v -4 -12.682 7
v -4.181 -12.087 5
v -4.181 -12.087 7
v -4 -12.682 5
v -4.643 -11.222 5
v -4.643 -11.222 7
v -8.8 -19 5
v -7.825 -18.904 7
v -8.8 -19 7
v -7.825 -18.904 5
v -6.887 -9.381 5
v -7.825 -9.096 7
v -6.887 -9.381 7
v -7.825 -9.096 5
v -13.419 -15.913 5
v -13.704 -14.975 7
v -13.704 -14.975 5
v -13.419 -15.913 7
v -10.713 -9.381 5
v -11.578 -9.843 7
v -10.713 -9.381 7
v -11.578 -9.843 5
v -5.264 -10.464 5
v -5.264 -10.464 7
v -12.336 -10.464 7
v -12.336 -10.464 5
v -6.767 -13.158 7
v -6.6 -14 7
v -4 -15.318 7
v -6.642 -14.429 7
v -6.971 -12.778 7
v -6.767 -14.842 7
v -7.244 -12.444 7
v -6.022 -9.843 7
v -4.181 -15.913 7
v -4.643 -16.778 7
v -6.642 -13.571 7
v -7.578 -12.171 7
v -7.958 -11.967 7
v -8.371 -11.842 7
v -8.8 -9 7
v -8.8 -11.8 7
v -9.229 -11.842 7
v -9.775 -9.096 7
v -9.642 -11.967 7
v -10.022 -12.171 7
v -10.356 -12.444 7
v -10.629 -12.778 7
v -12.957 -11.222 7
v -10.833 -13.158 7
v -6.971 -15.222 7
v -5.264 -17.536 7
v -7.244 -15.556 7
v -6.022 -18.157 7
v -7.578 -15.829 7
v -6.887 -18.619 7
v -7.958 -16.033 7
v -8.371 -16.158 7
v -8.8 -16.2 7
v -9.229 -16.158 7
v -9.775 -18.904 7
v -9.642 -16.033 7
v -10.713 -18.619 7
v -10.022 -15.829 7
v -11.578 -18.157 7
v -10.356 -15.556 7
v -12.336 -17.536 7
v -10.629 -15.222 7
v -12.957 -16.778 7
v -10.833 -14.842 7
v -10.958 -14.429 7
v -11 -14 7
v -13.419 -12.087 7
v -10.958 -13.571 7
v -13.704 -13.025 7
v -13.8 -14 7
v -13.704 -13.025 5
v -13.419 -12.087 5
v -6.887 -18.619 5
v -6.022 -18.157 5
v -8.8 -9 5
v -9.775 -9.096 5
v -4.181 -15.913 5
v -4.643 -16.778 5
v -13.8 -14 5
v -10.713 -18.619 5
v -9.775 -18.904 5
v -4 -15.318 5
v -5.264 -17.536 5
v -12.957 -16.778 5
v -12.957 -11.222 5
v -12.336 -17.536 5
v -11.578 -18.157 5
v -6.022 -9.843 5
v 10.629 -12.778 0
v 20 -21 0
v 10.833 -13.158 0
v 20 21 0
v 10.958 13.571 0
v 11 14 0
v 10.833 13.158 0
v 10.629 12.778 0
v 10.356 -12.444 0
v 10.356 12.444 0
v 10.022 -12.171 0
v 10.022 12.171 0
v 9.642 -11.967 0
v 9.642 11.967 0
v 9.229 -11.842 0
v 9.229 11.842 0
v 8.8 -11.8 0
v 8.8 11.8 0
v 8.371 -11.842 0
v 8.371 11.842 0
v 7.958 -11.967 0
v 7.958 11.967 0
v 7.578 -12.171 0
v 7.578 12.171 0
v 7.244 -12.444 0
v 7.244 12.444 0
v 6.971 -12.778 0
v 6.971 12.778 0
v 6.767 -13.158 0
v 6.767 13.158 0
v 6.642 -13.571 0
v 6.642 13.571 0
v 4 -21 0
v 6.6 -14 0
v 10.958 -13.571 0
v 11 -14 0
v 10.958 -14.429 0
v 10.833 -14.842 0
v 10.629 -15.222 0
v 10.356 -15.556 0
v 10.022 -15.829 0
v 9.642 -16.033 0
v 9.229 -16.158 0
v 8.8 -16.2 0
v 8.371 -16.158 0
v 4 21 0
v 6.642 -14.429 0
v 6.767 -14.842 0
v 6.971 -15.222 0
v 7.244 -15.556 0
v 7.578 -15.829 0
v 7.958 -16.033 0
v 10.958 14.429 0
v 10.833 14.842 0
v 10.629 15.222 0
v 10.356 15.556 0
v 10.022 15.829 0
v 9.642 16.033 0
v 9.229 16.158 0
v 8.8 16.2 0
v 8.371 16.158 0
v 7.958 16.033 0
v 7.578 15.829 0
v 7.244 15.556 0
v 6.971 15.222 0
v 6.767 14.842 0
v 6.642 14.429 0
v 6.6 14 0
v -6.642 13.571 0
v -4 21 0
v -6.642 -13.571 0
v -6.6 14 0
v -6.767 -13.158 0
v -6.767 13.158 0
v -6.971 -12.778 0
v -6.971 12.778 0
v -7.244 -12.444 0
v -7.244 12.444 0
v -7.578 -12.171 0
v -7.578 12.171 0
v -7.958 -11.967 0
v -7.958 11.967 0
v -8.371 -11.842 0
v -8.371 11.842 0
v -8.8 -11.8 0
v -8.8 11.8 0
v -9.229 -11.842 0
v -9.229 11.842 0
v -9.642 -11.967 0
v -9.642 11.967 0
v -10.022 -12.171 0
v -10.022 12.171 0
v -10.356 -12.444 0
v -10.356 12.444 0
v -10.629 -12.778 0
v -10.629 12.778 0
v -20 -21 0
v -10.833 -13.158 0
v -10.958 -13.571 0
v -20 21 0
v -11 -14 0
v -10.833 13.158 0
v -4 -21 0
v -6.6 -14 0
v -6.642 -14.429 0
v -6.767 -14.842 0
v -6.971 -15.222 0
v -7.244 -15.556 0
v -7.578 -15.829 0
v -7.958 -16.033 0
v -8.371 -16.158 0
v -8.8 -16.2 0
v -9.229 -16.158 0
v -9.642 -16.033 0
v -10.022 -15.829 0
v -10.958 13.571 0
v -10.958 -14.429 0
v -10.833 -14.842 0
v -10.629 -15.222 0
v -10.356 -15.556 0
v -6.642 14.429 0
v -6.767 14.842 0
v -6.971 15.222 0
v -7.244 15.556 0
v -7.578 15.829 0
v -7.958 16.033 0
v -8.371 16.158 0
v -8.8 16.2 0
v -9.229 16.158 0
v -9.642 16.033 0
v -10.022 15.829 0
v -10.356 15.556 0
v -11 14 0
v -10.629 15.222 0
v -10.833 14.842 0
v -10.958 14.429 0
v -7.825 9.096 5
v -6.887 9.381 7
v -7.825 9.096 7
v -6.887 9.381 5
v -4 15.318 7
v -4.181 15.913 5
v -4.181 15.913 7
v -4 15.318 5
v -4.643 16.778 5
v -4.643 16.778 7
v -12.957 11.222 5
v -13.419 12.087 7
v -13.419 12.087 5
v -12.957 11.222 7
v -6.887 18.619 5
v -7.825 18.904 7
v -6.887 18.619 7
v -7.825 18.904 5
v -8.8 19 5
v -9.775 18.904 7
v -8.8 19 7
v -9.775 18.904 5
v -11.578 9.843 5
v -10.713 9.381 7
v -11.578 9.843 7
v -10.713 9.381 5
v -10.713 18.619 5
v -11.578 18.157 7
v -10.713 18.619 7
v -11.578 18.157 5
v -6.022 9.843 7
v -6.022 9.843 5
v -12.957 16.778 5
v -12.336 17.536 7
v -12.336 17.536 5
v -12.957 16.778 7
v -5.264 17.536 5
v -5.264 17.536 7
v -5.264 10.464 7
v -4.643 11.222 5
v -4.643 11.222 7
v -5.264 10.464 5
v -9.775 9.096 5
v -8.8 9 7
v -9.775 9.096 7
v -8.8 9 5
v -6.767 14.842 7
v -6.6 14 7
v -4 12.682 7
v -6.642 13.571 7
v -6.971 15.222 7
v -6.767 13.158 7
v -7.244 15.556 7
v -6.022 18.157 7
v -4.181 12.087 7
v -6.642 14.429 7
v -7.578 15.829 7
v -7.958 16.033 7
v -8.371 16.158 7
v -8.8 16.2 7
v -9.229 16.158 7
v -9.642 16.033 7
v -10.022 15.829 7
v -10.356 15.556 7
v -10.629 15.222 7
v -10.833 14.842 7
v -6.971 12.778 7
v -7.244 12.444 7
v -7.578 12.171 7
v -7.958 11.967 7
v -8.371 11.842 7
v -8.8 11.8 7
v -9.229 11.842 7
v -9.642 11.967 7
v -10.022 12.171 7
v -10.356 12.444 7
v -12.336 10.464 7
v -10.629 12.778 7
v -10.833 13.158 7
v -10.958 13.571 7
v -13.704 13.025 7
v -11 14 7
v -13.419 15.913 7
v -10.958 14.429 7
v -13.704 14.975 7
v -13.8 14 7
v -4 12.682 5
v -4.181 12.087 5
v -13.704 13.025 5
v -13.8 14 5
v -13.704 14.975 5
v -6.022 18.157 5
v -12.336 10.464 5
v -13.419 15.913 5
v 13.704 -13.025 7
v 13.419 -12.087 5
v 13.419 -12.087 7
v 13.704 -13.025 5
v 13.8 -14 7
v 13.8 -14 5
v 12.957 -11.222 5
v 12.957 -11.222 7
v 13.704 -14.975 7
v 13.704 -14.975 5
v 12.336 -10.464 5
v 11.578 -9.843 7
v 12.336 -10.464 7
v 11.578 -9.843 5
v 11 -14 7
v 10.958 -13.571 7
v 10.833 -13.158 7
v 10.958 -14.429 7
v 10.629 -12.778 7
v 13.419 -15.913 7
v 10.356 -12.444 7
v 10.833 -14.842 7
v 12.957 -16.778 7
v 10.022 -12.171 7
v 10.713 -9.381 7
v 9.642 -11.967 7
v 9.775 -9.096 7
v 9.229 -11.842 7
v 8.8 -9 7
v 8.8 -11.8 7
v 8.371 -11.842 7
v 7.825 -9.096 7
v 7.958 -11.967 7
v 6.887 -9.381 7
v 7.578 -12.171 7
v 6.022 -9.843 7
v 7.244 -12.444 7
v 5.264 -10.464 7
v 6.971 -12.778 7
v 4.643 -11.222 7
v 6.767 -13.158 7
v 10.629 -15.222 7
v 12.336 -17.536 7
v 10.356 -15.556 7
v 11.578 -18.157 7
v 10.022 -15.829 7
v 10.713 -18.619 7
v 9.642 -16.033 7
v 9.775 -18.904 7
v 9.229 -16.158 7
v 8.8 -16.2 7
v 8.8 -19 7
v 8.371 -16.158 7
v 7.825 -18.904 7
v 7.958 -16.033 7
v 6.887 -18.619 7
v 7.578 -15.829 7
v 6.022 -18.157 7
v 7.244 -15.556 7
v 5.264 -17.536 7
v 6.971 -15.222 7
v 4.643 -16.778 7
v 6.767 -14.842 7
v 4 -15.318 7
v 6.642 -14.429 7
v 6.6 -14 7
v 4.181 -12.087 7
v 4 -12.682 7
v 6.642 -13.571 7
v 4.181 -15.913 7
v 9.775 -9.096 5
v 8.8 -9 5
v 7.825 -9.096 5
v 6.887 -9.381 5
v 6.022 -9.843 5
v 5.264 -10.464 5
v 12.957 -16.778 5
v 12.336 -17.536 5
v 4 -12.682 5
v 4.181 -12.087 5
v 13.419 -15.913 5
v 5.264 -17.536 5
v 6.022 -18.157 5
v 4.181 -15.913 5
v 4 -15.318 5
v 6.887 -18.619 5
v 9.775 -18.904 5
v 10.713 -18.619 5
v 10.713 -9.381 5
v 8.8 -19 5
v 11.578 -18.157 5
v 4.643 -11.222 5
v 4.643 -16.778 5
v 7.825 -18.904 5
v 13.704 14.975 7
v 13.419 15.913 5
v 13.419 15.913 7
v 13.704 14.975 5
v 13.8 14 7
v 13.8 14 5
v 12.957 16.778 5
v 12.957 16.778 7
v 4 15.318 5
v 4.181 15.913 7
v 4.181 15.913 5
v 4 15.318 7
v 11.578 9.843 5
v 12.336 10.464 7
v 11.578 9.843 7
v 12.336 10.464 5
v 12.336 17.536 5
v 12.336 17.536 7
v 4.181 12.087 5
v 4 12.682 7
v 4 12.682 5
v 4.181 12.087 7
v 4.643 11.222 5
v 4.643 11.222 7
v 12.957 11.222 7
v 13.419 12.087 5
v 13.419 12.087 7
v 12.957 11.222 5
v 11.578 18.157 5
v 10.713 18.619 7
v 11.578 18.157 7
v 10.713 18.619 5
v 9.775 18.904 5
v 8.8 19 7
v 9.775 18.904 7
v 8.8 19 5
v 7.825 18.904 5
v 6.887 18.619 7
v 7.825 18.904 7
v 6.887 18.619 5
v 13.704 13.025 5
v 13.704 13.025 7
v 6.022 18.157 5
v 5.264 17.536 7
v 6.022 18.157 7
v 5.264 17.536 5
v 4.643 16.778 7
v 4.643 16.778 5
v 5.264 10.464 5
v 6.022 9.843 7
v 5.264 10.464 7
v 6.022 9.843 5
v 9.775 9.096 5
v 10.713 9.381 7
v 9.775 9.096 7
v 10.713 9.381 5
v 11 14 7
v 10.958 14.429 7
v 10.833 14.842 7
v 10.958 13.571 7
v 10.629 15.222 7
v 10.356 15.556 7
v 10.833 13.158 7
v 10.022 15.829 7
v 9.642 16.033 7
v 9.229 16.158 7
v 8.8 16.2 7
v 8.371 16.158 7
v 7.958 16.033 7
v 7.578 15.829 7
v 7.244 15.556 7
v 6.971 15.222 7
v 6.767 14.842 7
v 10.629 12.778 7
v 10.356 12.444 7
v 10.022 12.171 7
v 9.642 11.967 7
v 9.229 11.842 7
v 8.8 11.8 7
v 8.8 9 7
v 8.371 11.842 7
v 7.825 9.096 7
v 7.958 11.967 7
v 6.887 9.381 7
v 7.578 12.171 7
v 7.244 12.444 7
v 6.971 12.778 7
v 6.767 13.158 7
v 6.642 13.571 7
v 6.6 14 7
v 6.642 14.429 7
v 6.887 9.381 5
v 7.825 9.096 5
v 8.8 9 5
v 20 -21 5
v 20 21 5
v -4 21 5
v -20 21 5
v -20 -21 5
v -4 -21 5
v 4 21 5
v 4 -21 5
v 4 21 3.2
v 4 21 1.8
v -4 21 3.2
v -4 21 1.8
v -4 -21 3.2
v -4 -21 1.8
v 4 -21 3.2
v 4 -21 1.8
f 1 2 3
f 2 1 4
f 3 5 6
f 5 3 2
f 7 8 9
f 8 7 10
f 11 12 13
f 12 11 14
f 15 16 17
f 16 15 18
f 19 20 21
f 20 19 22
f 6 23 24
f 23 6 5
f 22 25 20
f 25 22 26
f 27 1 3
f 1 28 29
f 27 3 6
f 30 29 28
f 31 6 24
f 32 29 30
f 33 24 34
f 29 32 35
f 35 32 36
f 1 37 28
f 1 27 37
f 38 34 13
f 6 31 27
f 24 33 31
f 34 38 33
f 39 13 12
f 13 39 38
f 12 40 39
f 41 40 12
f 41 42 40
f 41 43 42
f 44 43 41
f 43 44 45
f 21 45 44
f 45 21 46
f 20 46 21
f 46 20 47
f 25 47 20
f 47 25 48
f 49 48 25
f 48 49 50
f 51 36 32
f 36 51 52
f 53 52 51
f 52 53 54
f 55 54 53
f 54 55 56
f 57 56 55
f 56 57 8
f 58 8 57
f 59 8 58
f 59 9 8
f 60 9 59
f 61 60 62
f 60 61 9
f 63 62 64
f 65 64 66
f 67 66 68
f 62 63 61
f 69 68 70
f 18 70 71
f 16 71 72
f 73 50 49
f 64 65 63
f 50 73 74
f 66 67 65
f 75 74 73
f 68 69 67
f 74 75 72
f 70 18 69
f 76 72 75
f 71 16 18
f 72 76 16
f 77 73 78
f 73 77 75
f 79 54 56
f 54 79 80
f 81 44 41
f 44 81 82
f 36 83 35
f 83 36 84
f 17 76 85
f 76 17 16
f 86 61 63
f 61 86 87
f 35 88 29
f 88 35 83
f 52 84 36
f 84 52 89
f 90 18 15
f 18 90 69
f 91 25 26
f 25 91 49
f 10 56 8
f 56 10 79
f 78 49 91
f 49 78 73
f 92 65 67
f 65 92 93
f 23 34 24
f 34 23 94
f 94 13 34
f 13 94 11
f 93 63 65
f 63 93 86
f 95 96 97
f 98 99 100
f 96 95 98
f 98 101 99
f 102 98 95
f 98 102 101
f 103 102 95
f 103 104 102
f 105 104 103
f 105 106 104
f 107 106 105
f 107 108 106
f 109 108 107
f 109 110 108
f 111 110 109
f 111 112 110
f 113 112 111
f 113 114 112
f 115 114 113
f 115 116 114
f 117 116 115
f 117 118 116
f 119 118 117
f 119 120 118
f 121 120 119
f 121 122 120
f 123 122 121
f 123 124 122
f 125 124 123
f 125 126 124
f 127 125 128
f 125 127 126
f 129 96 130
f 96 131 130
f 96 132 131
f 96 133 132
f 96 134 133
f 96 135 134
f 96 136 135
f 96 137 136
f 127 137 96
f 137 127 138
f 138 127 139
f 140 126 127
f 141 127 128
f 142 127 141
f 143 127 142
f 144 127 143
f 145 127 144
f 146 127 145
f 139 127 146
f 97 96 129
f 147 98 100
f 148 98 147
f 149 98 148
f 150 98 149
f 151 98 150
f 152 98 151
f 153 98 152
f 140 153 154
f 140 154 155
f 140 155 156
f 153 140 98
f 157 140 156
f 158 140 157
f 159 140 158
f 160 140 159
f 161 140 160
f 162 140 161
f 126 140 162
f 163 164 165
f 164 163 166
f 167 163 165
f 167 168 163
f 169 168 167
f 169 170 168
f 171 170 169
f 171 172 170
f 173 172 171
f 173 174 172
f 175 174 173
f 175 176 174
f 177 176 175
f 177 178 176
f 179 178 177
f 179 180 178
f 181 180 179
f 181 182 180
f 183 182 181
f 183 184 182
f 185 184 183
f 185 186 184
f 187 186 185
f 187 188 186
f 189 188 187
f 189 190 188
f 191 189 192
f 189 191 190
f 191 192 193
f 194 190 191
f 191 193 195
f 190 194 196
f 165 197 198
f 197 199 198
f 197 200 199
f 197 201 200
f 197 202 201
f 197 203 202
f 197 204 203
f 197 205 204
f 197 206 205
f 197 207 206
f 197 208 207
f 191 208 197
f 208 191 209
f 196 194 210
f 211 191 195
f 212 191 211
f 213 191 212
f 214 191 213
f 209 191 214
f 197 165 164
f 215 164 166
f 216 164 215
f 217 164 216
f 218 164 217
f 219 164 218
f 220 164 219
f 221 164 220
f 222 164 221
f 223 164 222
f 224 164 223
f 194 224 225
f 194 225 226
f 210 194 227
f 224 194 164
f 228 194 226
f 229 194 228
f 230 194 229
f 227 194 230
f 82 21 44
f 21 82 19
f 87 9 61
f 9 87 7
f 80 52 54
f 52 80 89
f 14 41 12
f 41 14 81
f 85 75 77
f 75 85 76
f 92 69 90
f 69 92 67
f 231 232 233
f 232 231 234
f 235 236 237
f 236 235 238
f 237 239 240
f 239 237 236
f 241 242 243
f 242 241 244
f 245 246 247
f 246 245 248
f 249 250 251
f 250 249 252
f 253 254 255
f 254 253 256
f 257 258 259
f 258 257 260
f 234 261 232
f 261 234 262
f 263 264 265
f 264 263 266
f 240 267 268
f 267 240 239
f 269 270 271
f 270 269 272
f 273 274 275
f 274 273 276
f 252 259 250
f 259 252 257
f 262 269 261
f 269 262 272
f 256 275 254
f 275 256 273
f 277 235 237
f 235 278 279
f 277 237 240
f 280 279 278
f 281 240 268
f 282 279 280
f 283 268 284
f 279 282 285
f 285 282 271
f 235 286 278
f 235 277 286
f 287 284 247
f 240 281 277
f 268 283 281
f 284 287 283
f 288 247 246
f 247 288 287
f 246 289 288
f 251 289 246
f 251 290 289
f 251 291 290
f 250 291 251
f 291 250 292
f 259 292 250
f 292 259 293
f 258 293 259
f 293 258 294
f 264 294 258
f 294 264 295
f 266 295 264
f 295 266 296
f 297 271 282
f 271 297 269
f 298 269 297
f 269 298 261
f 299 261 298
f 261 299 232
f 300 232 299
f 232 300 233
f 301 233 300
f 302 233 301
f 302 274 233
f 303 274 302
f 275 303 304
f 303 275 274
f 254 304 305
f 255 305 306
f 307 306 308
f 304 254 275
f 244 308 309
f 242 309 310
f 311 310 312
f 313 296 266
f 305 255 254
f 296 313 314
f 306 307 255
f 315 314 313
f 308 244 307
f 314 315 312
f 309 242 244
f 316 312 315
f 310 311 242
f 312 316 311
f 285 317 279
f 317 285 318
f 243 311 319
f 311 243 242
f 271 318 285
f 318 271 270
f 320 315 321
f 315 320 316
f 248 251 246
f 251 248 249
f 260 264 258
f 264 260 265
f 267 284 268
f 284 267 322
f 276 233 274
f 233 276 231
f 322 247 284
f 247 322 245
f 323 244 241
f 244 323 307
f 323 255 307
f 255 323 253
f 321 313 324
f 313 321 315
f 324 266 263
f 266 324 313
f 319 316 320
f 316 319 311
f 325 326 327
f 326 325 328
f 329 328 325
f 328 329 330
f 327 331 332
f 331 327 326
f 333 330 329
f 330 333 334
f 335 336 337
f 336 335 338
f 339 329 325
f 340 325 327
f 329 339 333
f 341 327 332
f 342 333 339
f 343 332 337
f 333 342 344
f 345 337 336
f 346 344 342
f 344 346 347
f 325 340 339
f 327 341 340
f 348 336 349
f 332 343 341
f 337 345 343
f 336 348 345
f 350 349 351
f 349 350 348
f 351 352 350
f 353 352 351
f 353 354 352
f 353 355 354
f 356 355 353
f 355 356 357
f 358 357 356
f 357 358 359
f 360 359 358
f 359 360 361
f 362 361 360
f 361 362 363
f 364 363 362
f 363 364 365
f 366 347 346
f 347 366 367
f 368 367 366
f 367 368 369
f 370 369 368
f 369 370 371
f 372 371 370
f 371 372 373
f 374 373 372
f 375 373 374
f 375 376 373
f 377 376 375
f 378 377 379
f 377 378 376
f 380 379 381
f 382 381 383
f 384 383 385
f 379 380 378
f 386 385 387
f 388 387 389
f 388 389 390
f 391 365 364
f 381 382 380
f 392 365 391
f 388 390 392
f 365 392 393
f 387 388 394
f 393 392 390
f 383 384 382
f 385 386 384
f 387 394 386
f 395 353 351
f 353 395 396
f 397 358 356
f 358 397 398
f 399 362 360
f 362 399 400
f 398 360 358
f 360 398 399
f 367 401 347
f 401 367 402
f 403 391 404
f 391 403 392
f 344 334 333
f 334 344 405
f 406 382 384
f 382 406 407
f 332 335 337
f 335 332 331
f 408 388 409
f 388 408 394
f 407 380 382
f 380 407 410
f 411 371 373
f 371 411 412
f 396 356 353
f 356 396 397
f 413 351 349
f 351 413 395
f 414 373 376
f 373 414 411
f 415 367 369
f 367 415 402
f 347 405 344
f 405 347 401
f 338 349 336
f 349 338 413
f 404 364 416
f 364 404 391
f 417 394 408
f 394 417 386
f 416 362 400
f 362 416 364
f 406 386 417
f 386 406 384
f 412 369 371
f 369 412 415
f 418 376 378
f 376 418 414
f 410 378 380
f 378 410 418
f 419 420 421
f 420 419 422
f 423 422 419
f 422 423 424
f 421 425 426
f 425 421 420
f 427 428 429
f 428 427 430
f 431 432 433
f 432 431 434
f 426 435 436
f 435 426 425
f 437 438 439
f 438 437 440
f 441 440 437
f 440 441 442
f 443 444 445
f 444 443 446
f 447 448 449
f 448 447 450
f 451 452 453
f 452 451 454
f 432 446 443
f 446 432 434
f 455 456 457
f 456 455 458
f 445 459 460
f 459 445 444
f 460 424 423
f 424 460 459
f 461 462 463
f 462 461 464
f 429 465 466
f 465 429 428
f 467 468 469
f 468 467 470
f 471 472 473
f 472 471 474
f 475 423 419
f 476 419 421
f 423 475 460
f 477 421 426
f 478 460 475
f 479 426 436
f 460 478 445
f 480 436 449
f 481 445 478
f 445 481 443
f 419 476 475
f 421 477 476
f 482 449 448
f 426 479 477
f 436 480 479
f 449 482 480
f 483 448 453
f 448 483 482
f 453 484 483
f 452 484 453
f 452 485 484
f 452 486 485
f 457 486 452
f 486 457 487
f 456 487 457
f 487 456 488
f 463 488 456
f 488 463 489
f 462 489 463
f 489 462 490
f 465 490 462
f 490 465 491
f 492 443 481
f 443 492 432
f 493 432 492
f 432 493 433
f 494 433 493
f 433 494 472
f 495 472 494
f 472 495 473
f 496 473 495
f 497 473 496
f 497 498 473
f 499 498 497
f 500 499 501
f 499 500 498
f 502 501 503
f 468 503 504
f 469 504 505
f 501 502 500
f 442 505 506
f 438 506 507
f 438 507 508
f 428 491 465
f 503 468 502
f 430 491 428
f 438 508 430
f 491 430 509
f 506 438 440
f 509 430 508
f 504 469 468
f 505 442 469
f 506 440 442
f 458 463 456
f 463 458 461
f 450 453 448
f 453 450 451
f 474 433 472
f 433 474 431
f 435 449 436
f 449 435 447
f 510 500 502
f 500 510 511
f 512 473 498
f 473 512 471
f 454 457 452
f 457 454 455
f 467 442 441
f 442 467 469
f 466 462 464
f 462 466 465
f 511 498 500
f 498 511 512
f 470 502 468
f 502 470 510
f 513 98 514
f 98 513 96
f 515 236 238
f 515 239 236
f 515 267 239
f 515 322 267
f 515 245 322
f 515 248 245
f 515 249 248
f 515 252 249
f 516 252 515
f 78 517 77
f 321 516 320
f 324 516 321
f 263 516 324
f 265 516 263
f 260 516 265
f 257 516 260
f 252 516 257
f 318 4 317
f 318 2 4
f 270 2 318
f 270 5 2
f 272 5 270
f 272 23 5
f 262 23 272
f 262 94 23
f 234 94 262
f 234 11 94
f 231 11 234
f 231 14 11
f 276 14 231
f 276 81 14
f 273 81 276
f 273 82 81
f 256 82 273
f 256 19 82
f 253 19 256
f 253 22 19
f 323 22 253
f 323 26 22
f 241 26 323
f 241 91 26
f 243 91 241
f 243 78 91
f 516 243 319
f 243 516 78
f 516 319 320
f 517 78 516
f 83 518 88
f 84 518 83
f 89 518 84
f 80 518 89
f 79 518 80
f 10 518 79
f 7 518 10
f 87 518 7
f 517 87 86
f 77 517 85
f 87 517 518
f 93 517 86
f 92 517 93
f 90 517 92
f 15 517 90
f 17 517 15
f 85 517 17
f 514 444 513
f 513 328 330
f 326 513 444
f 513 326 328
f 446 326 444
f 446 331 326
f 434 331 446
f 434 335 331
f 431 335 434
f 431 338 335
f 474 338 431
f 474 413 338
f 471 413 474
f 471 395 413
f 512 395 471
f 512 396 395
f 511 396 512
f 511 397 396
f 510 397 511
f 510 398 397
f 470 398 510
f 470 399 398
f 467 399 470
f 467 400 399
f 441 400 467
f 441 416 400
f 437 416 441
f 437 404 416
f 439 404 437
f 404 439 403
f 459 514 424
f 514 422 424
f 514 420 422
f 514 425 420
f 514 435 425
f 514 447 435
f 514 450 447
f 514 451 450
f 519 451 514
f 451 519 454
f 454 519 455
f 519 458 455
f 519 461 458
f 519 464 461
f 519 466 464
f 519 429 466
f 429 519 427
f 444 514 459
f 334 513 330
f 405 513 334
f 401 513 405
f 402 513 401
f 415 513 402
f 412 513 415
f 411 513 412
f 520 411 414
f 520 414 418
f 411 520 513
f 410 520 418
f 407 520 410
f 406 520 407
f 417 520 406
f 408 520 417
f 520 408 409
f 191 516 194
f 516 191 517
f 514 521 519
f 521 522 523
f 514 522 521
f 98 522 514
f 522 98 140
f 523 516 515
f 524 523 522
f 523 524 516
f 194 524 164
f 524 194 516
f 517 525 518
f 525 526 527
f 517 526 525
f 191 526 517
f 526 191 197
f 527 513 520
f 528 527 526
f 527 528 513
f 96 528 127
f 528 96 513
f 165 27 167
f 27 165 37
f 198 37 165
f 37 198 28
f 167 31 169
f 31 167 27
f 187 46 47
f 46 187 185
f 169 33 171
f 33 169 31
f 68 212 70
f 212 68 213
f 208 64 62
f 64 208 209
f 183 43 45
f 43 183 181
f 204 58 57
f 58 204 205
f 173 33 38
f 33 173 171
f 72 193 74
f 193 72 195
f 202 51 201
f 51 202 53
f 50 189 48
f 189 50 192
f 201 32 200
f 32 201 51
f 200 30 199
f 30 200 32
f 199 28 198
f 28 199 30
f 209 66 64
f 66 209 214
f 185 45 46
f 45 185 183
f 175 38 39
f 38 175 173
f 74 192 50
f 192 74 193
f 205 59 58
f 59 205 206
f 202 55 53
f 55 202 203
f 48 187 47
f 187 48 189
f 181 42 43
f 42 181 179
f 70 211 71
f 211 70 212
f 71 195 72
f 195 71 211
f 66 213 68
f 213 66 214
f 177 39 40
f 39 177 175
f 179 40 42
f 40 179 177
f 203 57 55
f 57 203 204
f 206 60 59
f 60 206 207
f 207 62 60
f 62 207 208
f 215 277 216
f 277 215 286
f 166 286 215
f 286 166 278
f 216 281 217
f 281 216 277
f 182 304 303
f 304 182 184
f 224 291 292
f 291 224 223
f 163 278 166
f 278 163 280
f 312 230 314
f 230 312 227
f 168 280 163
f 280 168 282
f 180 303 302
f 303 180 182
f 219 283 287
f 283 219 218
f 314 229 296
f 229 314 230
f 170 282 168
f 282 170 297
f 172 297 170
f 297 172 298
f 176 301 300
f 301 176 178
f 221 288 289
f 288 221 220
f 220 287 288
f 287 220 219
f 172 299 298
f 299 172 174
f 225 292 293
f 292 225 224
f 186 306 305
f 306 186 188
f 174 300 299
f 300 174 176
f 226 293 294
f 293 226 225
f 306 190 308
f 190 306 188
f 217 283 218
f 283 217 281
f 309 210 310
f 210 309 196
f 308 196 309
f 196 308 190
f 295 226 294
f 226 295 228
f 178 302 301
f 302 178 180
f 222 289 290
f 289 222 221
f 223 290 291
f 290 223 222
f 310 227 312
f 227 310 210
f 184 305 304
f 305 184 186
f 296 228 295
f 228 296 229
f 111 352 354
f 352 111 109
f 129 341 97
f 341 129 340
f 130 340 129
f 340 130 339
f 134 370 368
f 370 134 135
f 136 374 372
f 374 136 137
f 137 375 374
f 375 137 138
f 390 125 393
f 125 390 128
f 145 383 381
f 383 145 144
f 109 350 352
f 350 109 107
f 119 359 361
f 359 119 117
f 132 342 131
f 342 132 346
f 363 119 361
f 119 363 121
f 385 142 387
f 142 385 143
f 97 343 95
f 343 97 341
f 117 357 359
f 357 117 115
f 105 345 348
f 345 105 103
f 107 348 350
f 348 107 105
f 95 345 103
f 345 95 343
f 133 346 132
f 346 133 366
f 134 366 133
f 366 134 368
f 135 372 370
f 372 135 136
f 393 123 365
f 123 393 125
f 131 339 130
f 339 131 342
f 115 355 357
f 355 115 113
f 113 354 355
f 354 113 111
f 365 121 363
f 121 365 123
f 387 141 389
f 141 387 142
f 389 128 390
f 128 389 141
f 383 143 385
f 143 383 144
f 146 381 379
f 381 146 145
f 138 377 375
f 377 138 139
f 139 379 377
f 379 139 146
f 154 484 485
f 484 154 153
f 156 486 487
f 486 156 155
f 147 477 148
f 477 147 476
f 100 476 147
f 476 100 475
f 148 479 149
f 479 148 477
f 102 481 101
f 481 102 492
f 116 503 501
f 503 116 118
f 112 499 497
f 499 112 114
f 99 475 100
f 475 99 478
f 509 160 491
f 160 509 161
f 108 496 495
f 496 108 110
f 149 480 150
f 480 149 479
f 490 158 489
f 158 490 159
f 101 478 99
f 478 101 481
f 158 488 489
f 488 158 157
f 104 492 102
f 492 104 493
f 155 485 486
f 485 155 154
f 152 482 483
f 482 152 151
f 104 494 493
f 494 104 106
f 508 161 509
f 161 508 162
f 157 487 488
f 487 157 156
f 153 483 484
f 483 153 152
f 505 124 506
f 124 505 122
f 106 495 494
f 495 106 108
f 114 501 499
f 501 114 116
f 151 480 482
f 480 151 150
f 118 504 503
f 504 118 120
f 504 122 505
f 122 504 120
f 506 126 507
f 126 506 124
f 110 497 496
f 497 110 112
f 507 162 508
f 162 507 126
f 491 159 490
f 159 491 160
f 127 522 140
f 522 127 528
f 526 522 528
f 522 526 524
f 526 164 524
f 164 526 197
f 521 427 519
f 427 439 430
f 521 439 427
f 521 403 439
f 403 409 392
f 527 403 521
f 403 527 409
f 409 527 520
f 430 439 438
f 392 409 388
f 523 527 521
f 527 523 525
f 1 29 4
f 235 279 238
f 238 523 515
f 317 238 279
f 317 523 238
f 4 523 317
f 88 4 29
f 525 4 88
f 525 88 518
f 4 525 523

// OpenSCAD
$fn = 32;

// ----------------------------------------------------------------------
// Living hinge: 40 x 42 mm plates, 1.4 mm flexible web
// ----------------------------------------------------------------------

// --- parameters (mm) ---
plate_len = 16;           // plate length outside the web
plate_w = 42;             // plate width
thick = 5;                // plate thickness
web_half = 4;             // half width of the flex band
web_t = 1.4;              // flexible web thickness
web_z = 1.8;              // web position inside the thickness
boss_d = 10;              // screw boss diameter
boss_h = 7;               // screw boss height
boss_x = 8.8;             // screw boss distance from the web
screw_d = 4.4;            // screw hole

difference() {
  union() {
    /* one flat strip, later thinned at the middle */
    translate([-20, -21, 0]) cube([40, 42, 5]);
    /* screw bosses, sunk 0.5 mm into the plates */
    for (sx = [-8.8, 8.8]) {
      for (sy = [-14, 14]) {
        translate([sx, sy, 0]) cylinder(h = boss_h, d = boss_d);
      }
    }
  }
  /* channel from below: leaves the web on top of it */
  translate([-4, -23.5, -2.5]) cube([8, 47, 4.3]);
  /* channel from above: thins the web down to web_t */
  translate([-4, -23.5, 3.2]) cube([8, 47, 4.3]);
  /* screw holes through the bosses */
  for (sx = [-8.8, 8.8]) {
    for (sy = [-14, 14]) {
      translate([sx, sy, -2.5]) cylinder(h = boss_h + 5, d = screw_d);
    }
  }
}
